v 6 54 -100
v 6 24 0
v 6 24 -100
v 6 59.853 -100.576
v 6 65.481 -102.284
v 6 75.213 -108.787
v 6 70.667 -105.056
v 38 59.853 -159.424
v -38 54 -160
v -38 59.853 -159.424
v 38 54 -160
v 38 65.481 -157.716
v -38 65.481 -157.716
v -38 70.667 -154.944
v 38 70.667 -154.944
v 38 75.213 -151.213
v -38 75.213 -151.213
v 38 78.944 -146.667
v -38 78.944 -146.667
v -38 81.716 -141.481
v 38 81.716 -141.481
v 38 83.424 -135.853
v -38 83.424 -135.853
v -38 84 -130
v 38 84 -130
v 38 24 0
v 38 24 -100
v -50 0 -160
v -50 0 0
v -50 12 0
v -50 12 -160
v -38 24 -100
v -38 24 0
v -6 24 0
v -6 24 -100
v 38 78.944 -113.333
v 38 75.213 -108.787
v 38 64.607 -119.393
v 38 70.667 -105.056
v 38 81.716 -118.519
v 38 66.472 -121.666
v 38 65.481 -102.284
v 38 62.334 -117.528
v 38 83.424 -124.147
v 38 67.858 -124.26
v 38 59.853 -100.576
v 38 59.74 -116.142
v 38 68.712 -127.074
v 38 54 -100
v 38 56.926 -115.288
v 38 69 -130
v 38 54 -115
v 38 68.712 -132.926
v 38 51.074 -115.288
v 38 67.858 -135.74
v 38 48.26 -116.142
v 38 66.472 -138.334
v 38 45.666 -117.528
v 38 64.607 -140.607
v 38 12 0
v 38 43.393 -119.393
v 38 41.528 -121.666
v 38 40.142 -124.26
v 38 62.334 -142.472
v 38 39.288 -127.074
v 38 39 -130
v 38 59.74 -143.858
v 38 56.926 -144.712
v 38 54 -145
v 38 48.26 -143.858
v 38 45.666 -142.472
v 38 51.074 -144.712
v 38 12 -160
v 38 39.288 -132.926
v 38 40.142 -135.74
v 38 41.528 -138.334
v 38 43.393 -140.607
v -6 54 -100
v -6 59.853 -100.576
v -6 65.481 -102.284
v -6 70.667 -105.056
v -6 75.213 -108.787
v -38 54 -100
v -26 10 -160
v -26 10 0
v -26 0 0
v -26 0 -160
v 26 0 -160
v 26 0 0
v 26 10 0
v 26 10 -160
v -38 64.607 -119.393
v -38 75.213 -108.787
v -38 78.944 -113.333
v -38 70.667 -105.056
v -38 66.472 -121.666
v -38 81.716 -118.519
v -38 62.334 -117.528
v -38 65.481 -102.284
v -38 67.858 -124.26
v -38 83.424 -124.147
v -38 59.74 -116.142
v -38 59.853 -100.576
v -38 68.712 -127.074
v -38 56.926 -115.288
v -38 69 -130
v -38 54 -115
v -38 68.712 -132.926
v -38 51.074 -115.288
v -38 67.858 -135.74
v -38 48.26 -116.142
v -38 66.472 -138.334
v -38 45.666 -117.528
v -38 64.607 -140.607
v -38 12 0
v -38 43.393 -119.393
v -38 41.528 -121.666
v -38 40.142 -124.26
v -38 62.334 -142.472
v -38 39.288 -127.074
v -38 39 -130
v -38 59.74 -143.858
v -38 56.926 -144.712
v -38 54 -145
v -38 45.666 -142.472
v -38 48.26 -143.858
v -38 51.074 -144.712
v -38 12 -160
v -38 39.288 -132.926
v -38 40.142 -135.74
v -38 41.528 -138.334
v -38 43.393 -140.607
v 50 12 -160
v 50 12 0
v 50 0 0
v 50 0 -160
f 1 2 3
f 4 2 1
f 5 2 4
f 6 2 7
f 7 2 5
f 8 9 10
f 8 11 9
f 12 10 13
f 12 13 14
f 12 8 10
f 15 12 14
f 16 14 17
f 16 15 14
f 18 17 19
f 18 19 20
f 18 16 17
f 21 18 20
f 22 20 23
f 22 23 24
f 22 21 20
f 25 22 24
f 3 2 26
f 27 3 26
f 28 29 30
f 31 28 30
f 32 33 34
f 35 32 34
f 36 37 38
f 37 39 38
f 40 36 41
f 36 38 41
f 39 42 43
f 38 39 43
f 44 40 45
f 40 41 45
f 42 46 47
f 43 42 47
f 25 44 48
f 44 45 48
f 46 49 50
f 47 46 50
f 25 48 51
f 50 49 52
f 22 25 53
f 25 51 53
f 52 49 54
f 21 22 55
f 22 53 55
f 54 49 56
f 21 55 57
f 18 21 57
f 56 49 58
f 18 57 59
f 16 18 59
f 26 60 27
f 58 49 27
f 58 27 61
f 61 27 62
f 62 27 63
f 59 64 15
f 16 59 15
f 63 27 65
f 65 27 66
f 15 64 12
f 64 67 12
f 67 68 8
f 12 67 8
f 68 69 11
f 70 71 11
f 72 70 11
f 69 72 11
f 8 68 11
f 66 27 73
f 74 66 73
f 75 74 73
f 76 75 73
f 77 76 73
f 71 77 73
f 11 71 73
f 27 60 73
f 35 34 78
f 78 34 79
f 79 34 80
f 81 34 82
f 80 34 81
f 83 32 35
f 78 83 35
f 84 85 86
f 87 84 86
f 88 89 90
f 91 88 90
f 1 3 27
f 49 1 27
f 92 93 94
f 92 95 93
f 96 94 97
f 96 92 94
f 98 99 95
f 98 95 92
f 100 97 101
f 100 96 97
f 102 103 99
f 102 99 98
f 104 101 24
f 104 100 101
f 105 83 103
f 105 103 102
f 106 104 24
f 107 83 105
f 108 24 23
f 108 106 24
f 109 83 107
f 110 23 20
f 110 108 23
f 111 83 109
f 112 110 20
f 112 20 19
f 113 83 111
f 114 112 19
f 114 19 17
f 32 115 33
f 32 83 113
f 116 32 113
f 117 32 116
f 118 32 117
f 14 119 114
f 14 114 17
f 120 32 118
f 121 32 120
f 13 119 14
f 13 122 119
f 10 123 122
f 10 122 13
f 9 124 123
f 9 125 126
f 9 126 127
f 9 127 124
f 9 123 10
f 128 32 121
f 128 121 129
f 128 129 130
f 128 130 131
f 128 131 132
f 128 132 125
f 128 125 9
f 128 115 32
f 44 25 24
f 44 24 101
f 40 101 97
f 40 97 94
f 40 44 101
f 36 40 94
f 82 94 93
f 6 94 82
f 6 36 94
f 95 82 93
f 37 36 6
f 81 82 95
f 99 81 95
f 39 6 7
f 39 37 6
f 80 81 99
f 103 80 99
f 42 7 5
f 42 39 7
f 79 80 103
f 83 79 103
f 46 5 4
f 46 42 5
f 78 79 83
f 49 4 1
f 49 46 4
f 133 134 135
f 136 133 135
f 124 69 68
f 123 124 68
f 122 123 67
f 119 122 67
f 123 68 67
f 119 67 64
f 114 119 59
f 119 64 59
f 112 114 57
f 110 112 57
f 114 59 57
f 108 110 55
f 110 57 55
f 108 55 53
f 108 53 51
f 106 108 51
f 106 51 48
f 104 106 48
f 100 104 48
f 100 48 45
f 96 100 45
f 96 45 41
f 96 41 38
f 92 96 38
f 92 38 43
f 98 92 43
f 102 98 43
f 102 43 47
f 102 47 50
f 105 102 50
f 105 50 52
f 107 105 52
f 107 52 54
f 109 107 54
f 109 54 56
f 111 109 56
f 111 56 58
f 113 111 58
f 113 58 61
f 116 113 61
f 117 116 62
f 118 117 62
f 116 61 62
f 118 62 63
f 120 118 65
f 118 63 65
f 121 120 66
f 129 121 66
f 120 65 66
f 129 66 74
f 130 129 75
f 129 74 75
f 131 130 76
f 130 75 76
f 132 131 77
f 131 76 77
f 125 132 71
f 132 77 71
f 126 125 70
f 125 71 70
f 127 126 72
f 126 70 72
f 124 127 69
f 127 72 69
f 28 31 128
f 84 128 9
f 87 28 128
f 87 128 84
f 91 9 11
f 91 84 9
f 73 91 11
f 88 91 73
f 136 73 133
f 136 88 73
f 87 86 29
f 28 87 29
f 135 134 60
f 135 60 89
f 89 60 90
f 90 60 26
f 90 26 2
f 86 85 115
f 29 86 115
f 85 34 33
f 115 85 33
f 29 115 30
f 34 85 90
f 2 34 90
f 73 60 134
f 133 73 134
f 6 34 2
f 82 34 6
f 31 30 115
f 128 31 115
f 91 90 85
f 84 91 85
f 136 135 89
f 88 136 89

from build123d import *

# Parameters (mm, degrees)
BOSS_EXTRUDE1_DEPTH = 160
SKETCH2_W           = 76
SKETCH2_H           = 60
BOSS_EXTRUDE2_DEPTH = 60
FILLET1_R           = 30
SKETCH3_R           = 15
CUT_EXTRUDE1_DEPTH  = 201.997512422
RIB1_REACH          = 189.499
SKETCH7_WALL_W      = 497.237426276
SKETCH7_WALL_H      = 12


with BuildPart() as part:
    # Sketch1 → Boss-Extrude1 (new body)
    with BuildSketch(Plane.XY):
        Polygon((-38, 24), (38, 24), (38, 12), (50, 12), (50, 0), (26, 0), (26, 10), (-26, 10), (-26, 0), (-50, 0), (-50, 12), (-38, 12), align=None)
    extrude(amount=-BOSS_EXTRUDE1_DEPTH)

    # Sketch2 → Boss-Extrude2 (add)
    with BuildSketch(Plane(origin=(0, 24, 0), x_dir=(1, 0, 0), z_dir=(0, 1, 0))):
        with Locations((0, 130)):
            Rectangle(SKETCH2_W, SKETCH2_H)
    extrude(amount=BOSS_EXTRUDE2_DEPTH)

    # Fillet1
    fillet1_edges = [part.edges().sort_by_distance(p)[0] for p in [
        (0, 84, -160),
        (0, 84, -100),
    ]]
    fillet(fillet1_edges, radius=FILLET1_R - 0.0001)  # a hair under: the kernel refuses the full size

    # Sketch3 → Cut-Extrude1 (cut, through all)
    with BuildSketch(Plane(origin=(38, 0, 0), x_dir=(0, 0, -1), z_dir=(1, 0, 0))):
        with Locations((130, 54)):
            Circle(SKETCH3_R)
    extrude(amount=-CUT_EXTRUDE1_DEPTH, mode=Mode.SUBTRACT)

    # Sketch7 wall → Rib1 (add, up to next)
    with BuildSketch(Plane(origin=(0, 49.606601718, -54.393398282), x_dir=(0, 0.42592923947, -0.904756477161), z_dir=(0, 0.904756477161, 0.42592923947)), mode=Mode.PRIVATE) as rib1_sk1:
        Rectangle(SKETCH7_WALL_W, SKETCH7_WALL_H)
    rib1_tool1 = extrude(rib1_sk1.sketch, amount=-RIB1_REACH, mode=Mode.PRIVATE) - part.part
    add(rib1_tool1.solids().sort_by_distance((0, 49.606601718, -54.393398282))[0])


solid = part.part
